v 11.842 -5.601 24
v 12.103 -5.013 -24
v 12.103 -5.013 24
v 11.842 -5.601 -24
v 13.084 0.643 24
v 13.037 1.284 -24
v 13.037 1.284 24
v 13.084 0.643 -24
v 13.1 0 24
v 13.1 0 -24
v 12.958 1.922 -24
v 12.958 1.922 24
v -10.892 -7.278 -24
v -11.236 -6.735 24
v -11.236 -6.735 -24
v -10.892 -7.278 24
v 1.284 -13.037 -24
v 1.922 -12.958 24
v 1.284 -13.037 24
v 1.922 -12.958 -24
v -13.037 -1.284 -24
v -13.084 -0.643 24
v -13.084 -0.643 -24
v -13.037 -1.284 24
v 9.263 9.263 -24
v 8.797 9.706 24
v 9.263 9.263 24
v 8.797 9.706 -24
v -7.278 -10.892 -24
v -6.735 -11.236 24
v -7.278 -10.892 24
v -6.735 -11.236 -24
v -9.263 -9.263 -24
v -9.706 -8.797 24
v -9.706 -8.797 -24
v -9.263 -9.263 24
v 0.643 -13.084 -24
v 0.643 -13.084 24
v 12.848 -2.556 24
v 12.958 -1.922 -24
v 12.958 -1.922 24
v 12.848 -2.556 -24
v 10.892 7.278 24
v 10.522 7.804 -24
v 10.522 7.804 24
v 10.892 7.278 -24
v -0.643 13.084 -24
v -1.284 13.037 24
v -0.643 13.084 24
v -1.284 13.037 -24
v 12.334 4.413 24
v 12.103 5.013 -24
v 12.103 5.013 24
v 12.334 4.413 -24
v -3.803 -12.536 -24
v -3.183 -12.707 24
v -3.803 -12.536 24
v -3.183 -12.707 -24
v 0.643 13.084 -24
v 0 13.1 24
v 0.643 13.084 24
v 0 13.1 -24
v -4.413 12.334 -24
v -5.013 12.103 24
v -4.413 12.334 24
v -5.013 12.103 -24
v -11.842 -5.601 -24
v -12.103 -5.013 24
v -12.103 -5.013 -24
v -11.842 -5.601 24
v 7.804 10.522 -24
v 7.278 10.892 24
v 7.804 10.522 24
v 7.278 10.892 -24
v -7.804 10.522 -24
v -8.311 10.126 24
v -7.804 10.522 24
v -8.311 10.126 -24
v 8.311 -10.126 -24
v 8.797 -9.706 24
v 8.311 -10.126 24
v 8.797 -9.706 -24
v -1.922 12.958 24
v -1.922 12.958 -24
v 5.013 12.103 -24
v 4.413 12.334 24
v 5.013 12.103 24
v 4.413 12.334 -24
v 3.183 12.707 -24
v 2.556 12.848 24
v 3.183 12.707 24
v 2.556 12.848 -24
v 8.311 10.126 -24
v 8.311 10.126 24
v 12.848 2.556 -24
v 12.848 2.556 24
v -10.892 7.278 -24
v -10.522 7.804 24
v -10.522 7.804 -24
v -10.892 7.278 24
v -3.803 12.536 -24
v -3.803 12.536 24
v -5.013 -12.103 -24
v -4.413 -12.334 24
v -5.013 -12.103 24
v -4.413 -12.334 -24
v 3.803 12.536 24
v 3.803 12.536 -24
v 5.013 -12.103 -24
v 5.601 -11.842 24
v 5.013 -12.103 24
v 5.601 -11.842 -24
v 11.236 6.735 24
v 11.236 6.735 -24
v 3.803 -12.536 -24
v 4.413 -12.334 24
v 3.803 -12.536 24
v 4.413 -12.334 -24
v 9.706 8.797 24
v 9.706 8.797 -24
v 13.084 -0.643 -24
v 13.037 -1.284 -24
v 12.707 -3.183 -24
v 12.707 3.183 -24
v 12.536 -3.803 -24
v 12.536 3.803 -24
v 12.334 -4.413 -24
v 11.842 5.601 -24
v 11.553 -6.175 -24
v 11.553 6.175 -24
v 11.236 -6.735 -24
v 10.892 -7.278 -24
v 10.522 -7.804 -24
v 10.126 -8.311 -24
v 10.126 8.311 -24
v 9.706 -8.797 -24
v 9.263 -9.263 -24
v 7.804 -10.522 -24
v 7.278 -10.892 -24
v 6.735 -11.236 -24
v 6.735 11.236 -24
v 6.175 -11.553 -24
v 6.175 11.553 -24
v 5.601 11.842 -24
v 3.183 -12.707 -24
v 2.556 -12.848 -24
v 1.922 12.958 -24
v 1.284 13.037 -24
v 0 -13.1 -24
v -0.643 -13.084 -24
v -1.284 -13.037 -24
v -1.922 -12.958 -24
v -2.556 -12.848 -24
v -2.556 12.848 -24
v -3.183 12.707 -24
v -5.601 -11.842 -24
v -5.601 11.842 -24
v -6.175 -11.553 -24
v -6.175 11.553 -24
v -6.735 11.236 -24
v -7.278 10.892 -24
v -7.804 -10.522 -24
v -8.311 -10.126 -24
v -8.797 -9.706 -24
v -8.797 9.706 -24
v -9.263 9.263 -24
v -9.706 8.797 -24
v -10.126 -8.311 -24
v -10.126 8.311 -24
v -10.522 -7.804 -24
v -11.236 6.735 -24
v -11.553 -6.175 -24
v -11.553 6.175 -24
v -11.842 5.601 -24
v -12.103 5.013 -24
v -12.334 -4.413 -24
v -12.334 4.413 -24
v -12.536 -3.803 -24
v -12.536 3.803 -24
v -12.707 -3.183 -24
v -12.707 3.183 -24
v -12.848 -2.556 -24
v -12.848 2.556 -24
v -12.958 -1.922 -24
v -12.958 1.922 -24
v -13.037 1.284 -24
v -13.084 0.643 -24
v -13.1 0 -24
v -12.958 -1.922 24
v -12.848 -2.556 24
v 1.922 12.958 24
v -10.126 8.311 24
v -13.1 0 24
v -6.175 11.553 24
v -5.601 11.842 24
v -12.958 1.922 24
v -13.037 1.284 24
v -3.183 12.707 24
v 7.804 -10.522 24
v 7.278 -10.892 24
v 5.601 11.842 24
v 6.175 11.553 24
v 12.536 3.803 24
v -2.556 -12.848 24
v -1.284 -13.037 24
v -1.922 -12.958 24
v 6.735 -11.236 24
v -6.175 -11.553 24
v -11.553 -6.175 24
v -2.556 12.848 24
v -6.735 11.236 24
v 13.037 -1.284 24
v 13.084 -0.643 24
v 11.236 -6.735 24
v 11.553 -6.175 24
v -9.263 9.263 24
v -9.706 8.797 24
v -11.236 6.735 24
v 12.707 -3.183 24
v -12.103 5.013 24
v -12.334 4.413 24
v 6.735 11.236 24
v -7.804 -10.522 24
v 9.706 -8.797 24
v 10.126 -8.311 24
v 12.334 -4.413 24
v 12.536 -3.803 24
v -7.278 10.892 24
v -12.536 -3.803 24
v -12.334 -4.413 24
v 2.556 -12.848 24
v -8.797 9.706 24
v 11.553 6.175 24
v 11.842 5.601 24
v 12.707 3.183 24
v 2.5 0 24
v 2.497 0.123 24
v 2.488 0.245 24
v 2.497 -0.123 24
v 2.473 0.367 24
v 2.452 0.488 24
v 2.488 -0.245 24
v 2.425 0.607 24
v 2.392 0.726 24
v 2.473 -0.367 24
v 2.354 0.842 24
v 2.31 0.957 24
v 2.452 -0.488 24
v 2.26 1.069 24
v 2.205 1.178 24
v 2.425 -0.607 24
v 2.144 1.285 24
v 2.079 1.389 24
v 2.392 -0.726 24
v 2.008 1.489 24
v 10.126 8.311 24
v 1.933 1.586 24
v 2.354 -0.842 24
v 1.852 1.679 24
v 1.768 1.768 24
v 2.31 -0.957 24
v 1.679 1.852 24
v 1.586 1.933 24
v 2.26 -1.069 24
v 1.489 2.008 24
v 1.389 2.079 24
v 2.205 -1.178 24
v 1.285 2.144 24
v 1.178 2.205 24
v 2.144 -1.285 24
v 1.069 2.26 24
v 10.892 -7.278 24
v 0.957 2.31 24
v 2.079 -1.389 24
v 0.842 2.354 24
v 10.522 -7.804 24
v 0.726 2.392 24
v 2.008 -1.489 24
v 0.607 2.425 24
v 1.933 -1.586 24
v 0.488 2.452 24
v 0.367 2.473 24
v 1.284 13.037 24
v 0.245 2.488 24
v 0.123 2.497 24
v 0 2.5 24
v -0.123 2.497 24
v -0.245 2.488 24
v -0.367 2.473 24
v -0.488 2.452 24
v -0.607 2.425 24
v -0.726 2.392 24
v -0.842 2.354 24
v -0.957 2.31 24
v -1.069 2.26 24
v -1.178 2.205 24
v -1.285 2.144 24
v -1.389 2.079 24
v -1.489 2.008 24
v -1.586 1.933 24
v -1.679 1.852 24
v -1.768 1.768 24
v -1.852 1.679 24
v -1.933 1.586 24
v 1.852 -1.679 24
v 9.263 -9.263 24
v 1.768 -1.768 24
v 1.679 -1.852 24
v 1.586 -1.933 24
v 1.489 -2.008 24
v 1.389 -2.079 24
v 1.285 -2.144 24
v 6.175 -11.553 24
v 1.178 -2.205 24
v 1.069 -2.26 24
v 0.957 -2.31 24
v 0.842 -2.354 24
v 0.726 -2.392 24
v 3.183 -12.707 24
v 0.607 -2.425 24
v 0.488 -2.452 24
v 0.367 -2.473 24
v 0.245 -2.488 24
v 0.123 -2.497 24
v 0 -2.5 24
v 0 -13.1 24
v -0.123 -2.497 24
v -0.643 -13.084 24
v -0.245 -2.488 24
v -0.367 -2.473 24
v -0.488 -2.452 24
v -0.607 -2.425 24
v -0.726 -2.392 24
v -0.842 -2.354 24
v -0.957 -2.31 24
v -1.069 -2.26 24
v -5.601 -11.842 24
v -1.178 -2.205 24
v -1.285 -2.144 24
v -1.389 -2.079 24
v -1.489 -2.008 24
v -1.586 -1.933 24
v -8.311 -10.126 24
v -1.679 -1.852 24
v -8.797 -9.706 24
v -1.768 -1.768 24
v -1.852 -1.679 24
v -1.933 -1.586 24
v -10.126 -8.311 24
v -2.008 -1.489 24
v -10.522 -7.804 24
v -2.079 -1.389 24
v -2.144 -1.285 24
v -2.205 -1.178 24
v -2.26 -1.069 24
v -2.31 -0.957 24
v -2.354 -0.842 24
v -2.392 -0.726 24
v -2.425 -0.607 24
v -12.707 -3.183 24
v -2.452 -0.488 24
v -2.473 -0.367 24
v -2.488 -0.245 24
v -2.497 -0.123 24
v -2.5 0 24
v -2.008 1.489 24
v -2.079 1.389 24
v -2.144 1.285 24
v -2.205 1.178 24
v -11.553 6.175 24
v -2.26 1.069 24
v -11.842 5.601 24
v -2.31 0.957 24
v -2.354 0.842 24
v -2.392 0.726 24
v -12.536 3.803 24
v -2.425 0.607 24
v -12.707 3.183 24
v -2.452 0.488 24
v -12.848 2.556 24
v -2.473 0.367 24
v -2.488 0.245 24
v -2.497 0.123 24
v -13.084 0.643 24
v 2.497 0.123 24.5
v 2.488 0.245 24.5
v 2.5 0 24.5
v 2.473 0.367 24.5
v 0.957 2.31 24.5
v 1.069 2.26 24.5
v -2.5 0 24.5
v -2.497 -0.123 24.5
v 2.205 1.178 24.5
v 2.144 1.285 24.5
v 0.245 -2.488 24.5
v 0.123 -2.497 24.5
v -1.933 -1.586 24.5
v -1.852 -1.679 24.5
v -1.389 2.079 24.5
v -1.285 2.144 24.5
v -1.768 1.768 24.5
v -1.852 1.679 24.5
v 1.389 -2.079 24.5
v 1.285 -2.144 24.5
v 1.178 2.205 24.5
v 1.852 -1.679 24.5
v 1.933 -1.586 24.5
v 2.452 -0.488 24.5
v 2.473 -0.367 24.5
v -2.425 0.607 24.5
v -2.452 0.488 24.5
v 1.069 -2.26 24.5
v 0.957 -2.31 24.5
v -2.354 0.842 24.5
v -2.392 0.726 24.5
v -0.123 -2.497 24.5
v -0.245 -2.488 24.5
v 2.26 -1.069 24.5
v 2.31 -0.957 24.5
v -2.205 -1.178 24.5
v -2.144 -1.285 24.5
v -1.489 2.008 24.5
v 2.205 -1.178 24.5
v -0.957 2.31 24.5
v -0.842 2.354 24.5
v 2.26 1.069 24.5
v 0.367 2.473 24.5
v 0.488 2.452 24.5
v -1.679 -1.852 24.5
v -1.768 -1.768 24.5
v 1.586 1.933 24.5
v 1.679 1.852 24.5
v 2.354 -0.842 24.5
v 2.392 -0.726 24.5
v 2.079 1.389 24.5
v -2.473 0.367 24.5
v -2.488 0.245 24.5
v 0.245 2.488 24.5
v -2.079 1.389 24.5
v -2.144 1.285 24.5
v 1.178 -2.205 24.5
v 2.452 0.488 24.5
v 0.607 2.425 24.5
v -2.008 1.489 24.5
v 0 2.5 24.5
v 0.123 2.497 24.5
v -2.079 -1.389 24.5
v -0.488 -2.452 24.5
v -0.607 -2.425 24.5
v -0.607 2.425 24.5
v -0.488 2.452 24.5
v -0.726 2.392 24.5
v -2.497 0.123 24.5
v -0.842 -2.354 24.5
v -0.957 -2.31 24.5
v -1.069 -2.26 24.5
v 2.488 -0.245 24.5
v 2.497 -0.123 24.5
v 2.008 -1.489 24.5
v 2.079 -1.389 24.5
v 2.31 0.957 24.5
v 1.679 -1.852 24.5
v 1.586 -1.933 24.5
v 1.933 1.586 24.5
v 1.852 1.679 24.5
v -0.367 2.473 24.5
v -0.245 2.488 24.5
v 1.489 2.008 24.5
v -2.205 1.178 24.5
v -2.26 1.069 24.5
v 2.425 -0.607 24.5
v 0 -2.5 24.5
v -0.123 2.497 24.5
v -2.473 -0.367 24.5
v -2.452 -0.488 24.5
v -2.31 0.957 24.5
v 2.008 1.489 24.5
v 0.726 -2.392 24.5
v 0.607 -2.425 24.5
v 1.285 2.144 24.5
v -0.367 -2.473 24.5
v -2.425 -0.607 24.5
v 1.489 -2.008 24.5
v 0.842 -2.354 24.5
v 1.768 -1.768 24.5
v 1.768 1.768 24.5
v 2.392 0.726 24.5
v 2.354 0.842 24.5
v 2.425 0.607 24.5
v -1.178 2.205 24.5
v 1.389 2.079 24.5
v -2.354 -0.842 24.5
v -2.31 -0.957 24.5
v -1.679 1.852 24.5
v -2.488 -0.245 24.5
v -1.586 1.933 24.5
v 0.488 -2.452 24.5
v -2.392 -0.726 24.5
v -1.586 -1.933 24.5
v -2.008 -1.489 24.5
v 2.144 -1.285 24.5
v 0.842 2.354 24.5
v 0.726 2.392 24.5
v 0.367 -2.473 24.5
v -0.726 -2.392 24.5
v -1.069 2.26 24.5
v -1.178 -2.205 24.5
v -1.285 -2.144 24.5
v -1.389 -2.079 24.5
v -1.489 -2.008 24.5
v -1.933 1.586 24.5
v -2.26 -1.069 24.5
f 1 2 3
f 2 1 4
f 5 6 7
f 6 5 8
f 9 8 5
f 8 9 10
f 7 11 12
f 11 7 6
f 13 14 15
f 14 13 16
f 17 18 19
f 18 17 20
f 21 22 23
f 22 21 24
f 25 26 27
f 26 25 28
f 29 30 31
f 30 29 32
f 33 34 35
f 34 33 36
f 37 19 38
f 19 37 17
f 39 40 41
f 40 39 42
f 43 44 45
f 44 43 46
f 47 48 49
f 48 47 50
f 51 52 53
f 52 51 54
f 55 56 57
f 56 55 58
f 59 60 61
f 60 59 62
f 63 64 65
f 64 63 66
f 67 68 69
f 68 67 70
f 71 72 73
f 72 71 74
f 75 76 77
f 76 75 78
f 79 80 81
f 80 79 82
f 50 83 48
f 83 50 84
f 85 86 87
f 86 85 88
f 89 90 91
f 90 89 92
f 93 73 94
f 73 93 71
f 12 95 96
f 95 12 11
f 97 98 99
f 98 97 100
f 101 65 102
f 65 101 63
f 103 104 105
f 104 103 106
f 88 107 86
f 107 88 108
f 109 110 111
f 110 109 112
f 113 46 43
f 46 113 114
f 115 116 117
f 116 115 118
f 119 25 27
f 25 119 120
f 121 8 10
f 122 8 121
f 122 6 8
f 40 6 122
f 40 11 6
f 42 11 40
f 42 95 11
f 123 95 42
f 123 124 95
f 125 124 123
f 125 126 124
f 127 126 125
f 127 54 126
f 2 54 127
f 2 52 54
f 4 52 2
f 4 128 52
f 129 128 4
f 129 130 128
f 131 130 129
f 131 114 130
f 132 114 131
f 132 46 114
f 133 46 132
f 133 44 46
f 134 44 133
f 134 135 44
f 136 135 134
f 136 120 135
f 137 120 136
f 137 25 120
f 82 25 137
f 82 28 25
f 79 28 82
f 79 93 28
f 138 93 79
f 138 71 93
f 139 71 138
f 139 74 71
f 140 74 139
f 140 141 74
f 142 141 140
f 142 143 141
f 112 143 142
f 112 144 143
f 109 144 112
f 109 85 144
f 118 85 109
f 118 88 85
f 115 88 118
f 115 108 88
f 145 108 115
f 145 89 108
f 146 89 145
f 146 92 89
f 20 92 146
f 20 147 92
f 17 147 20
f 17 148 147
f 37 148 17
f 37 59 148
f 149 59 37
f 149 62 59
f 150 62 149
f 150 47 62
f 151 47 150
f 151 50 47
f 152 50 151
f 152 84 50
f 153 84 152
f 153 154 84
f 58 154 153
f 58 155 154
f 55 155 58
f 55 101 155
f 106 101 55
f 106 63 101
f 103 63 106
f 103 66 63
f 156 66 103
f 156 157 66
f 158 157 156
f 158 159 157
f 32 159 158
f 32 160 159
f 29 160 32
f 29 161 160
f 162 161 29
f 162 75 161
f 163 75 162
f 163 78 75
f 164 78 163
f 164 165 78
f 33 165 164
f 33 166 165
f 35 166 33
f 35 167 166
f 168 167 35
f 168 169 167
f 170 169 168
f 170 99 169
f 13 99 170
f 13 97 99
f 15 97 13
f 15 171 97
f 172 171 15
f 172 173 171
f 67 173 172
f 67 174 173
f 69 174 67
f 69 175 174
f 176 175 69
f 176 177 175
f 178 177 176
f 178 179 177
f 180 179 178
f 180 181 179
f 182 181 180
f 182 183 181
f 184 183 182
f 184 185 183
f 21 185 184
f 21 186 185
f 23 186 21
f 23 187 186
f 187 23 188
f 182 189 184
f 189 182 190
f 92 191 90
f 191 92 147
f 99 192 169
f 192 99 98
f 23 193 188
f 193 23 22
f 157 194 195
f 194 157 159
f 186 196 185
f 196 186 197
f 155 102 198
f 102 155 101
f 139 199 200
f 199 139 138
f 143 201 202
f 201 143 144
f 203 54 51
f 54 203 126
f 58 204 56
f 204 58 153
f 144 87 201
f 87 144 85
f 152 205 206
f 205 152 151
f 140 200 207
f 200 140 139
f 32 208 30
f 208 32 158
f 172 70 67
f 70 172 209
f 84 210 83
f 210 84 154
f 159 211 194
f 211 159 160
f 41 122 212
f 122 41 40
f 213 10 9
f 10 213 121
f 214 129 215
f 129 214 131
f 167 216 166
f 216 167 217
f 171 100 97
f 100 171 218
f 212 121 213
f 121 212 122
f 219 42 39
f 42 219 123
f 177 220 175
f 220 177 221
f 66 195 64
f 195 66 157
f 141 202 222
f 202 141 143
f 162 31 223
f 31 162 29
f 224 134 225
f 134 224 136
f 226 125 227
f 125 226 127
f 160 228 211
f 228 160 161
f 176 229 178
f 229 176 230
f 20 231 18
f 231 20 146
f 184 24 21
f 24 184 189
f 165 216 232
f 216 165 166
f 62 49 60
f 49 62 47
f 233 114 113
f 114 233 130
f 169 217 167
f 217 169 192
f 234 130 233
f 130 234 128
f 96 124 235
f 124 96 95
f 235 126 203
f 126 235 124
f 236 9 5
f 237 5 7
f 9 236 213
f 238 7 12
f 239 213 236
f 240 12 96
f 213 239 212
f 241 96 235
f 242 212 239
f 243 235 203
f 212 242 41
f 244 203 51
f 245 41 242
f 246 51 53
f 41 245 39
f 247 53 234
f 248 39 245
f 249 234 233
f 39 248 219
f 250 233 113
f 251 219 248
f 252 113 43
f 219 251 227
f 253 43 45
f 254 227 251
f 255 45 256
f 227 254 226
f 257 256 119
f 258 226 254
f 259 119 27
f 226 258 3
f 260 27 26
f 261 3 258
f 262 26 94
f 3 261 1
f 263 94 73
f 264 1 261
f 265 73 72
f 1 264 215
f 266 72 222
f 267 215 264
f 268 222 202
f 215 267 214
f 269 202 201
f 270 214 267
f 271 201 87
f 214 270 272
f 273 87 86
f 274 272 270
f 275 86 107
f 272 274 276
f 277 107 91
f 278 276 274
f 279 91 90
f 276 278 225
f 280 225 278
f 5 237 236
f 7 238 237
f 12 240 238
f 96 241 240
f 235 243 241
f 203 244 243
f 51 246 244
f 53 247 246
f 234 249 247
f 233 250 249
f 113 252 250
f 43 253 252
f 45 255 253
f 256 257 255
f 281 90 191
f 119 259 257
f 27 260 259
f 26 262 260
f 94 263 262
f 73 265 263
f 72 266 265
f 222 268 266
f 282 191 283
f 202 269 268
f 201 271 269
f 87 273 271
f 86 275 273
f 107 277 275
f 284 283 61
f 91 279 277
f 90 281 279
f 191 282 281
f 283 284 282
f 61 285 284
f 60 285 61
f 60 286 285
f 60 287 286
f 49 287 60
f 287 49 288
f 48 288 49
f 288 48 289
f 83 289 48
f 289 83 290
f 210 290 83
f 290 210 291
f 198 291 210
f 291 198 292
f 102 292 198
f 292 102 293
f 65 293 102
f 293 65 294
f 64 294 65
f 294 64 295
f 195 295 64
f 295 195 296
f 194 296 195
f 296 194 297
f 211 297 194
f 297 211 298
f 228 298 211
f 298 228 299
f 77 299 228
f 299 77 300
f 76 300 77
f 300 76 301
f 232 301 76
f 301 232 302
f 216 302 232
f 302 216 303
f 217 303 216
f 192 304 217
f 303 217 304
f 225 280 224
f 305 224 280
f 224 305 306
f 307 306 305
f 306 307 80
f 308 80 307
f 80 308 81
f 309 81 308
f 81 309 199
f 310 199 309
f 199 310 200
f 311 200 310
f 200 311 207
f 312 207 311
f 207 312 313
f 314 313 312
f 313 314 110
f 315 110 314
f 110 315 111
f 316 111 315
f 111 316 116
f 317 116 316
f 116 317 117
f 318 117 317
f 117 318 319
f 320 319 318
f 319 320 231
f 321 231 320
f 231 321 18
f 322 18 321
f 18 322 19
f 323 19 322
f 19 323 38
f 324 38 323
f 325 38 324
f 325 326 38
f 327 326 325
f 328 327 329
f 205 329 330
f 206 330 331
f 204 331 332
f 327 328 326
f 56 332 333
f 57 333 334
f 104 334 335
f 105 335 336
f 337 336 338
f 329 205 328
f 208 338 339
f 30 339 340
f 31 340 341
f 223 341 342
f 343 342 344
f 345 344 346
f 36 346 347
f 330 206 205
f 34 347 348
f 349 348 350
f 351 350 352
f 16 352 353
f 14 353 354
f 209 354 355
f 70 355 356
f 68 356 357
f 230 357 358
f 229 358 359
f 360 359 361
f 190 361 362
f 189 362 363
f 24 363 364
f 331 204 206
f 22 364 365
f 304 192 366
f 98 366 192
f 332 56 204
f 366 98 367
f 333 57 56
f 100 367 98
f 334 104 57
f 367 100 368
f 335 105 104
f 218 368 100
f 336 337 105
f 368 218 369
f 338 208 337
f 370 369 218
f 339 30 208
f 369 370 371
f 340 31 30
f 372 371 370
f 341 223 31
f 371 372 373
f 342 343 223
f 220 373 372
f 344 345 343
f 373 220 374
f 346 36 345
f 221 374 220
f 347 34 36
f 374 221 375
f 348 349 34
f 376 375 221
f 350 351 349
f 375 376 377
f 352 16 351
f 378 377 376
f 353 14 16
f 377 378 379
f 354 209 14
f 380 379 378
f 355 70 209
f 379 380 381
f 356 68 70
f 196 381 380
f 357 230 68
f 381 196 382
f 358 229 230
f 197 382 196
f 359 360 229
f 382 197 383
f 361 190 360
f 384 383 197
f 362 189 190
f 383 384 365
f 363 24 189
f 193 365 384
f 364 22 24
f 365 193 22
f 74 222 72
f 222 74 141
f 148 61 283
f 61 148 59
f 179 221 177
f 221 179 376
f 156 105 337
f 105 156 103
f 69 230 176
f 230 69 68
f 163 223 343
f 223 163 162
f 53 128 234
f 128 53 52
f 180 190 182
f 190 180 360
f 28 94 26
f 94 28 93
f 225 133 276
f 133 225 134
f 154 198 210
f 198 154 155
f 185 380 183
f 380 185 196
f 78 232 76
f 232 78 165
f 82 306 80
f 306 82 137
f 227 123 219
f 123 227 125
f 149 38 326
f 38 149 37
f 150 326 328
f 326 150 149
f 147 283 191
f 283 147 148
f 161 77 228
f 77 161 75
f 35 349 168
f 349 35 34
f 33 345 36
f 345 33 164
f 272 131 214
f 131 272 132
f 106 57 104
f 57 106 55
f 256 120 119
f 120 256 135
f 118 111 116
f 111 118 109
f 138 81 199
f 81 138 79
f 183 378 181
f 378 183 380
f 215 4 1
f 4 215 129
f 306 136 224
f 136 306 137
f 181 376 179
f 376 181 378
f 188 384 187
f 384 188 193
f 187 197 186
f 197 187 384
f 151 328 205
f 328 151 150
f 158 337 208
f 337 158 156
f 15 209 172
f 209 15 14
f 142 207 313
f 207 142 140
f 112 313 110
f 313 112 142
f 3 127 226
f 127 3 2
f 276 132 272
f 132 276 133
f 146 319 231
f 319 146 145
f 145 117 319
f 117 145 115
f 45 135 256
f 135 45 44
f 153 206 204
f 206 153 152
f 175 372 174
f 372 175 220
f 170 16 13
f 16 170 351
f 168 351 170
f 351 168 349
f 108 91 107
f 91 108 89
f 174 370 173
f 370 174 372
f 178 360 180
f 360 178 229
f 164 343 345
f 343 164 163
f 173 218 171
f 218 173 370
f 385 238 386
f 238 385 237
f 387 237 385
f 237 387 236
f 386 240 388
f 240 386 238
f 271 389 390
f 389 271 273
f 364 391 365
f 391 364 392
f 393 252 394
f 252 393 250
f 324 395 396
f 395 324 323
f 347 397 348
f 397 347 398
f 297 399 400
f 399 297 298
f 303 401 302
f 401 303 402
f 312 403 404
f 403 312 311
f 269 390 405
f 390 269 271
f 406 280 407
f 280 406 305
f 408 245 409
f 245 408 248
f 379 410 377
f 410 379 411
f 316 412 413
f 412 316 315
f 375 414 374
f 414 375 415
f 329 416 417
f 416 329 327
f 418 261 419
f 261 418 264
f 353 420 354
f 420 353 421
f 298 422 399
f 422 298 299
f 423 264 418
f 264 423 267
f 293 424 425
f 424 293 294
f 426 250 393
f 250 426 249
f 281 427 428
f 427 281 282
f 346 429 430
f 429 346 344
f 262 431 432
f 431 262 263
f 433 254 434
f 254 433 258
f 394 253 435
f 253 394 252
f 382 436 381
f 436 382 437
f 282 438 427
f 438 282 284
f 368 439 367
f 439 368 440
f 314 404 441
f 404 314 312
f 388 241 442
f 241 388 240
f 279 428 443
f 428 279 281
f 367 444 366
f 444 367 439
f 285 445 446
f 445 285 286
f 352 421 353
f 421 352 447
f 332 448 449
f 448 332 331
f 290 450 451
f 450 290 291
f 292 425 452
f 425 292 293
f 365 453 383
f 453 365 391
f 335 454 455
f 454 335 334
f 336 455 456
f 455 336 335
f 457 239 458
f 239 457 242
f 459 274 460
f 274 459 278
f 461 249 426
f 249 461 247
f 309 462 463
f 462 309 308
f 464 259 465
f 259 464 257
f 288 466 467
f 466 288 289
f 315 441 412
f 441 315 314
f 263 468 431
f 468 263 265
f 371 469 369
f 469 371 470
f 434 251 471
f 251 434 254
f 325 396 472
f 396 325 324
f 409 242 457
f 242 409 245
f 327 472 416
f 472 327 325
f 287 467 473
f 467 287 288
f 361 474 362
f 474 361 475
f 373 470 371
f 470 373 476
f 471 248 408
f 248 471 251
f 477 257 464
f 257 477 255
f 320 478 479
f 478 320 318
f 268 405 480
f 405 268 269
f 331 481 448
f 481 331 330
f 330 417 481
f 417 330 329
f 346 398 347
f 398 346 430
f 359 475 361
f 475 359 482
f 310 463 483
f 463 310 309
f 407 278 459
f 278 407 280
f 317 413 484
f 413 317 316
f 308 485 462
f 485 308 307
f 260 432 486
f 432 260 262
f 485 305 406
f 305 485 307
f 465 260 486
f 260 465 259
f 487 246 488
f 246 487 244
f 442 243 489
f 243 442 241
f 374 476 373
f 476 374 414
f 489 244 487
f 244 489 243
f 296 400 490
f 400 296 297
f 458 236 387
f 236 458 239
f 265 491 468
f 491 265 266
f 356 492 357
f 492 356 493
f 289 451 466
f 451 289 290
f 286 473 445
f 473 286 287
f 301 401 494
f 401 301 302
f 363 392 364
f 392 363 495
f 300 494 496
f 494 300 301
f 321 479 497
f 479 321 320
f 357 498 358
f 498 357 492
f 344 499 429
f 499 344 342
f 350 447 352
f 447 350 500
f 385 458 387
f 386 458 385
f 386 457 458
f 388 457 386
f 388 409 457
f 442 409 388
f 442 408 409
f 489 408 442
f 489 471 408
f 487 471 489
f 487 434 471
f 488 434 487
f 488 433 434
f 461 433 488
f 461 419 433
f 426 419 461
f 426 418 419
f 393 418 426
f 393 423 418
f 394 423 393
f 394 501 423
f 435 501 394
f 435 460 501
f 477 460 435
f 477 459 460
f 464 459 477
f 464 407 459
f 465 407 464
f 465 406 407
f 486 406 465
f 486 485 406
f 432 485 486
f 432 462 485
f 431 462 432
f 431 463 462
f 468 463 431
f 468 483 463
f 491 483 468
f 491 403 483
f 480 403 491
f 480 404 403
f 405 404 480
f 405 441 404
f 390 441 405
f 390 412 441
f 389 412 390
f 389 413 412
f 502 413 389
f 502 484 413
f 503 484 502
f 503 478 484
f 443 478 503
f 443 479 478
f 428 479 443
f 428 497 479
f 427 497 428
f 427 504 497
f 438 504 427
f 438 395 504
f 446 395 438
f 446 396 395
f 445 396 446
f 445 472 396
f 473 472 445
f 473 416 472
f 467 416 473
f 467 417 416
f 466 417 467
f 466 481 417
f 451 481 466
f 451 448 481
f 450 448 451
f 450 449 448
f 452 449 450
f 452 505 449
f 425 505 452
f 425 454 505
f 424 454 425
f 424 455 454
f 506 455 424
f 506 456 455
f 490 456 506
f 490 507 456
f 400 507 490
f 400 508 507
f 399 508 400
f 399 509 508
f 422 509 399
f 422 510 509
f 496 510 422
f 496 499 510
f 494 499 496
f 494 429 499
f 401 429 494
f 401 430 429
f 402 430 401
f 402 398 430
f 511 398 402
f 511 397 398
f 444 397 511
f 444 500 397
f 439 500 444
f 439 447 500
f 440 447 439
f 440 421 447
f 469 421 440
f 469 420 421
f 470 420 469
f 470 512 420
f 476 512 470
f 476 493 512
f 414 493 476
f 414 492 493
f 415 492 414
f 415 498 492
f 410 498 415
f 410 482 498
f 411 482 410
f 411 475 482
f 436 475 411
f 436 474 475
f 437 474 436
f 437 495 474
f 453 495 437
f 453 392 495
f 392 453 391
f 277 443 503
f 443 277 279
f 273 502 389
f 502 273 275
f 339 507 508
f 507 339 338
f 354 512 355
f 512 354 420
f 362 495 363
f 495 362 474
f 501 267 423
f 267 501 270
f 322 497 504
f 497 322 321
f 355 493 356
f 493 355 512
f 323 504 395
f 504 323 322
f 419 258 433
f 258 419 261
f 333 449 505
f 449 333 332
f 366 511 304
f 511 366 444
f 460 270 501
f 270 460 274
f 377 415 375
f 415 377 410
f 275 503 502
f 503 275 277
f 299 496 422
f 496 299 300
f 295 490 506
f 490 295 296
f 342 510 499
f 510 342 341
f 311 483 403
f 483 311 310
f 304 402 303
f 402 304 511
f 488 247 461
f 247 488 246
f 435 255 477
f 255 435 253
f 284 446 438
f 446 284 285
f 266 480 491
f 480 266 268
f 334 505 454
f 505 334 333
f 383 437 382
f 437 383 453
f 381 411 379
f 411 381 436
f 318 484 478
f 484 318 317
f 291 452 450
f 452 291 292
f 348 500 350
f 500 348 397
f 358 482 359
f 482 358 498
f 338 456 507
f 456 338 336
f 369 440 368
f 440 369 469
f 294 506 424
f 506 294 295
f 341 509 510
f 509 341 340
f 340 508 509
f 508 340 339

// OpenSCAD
// Battery cell (single connected solid)
// Fixes: bottom thin ring/edge floating + small gap by making the bottom face
// overlap into the main body and uniting all parts.

$fn = 128;

// Parameters (as requested)
battery_height = 50.0;      // Overall height
battery_diameter = 26.2;    // Outer diameter
terminal_button_height = 2; // Height of the positive terminal button
terminal_button_diameter = 5; // Diameter of the positive terminal button

// Connectivity controls
overlap = 1.5;              // 1–2mm overlap to guarantee attachment
bottom_face_thickness = 1.0; // Make the bottom "ring/edge" a real attached feature

// Main battery cell body (centered)
module cylindrical_cell_body() {
    // Body height excludes the button height, centered at origin
    cylinder(h = battery_height - terminal_button_height, d = battery_diameter, center = true);
}

// Positive terminal button (top), overlapped into body
module positive_terminal_button() {
    // Place so it intersects the top of the body by 'overlap'
    // Body top Z = (battery_height - terminal_button_height)/2
    translate([0, 0, (battery_height - terminal_button_height)/2 + terminal_button_height/2 - overlap])
        cylinder(h = terminal_button_height, d = terminal_button_diameter, center = true);
}

// Negative terminal contact face (bottom), thickened and overlapped into body
module negative_terminal_contact_face() {
    // Body bottom Z = -(battery_height - terminal_button_height)/2
    // Place a thin disk so it intersects the body by 'overlap'
    translate([0, 0, -(battery_height - terminal_button_height)/2 - bottom_face_thickness/2 + overlap])
        cylinder(h = bottom_face_thickness, d = battery_diameter, center = true);
}

// Complete battery model (single solid)
module battery() {
    union() {
        cylindrical_cell_body();
        positive_terminal_button();
        negative_terminal_contact_face();
    }
}

// Render the battery
battery();
